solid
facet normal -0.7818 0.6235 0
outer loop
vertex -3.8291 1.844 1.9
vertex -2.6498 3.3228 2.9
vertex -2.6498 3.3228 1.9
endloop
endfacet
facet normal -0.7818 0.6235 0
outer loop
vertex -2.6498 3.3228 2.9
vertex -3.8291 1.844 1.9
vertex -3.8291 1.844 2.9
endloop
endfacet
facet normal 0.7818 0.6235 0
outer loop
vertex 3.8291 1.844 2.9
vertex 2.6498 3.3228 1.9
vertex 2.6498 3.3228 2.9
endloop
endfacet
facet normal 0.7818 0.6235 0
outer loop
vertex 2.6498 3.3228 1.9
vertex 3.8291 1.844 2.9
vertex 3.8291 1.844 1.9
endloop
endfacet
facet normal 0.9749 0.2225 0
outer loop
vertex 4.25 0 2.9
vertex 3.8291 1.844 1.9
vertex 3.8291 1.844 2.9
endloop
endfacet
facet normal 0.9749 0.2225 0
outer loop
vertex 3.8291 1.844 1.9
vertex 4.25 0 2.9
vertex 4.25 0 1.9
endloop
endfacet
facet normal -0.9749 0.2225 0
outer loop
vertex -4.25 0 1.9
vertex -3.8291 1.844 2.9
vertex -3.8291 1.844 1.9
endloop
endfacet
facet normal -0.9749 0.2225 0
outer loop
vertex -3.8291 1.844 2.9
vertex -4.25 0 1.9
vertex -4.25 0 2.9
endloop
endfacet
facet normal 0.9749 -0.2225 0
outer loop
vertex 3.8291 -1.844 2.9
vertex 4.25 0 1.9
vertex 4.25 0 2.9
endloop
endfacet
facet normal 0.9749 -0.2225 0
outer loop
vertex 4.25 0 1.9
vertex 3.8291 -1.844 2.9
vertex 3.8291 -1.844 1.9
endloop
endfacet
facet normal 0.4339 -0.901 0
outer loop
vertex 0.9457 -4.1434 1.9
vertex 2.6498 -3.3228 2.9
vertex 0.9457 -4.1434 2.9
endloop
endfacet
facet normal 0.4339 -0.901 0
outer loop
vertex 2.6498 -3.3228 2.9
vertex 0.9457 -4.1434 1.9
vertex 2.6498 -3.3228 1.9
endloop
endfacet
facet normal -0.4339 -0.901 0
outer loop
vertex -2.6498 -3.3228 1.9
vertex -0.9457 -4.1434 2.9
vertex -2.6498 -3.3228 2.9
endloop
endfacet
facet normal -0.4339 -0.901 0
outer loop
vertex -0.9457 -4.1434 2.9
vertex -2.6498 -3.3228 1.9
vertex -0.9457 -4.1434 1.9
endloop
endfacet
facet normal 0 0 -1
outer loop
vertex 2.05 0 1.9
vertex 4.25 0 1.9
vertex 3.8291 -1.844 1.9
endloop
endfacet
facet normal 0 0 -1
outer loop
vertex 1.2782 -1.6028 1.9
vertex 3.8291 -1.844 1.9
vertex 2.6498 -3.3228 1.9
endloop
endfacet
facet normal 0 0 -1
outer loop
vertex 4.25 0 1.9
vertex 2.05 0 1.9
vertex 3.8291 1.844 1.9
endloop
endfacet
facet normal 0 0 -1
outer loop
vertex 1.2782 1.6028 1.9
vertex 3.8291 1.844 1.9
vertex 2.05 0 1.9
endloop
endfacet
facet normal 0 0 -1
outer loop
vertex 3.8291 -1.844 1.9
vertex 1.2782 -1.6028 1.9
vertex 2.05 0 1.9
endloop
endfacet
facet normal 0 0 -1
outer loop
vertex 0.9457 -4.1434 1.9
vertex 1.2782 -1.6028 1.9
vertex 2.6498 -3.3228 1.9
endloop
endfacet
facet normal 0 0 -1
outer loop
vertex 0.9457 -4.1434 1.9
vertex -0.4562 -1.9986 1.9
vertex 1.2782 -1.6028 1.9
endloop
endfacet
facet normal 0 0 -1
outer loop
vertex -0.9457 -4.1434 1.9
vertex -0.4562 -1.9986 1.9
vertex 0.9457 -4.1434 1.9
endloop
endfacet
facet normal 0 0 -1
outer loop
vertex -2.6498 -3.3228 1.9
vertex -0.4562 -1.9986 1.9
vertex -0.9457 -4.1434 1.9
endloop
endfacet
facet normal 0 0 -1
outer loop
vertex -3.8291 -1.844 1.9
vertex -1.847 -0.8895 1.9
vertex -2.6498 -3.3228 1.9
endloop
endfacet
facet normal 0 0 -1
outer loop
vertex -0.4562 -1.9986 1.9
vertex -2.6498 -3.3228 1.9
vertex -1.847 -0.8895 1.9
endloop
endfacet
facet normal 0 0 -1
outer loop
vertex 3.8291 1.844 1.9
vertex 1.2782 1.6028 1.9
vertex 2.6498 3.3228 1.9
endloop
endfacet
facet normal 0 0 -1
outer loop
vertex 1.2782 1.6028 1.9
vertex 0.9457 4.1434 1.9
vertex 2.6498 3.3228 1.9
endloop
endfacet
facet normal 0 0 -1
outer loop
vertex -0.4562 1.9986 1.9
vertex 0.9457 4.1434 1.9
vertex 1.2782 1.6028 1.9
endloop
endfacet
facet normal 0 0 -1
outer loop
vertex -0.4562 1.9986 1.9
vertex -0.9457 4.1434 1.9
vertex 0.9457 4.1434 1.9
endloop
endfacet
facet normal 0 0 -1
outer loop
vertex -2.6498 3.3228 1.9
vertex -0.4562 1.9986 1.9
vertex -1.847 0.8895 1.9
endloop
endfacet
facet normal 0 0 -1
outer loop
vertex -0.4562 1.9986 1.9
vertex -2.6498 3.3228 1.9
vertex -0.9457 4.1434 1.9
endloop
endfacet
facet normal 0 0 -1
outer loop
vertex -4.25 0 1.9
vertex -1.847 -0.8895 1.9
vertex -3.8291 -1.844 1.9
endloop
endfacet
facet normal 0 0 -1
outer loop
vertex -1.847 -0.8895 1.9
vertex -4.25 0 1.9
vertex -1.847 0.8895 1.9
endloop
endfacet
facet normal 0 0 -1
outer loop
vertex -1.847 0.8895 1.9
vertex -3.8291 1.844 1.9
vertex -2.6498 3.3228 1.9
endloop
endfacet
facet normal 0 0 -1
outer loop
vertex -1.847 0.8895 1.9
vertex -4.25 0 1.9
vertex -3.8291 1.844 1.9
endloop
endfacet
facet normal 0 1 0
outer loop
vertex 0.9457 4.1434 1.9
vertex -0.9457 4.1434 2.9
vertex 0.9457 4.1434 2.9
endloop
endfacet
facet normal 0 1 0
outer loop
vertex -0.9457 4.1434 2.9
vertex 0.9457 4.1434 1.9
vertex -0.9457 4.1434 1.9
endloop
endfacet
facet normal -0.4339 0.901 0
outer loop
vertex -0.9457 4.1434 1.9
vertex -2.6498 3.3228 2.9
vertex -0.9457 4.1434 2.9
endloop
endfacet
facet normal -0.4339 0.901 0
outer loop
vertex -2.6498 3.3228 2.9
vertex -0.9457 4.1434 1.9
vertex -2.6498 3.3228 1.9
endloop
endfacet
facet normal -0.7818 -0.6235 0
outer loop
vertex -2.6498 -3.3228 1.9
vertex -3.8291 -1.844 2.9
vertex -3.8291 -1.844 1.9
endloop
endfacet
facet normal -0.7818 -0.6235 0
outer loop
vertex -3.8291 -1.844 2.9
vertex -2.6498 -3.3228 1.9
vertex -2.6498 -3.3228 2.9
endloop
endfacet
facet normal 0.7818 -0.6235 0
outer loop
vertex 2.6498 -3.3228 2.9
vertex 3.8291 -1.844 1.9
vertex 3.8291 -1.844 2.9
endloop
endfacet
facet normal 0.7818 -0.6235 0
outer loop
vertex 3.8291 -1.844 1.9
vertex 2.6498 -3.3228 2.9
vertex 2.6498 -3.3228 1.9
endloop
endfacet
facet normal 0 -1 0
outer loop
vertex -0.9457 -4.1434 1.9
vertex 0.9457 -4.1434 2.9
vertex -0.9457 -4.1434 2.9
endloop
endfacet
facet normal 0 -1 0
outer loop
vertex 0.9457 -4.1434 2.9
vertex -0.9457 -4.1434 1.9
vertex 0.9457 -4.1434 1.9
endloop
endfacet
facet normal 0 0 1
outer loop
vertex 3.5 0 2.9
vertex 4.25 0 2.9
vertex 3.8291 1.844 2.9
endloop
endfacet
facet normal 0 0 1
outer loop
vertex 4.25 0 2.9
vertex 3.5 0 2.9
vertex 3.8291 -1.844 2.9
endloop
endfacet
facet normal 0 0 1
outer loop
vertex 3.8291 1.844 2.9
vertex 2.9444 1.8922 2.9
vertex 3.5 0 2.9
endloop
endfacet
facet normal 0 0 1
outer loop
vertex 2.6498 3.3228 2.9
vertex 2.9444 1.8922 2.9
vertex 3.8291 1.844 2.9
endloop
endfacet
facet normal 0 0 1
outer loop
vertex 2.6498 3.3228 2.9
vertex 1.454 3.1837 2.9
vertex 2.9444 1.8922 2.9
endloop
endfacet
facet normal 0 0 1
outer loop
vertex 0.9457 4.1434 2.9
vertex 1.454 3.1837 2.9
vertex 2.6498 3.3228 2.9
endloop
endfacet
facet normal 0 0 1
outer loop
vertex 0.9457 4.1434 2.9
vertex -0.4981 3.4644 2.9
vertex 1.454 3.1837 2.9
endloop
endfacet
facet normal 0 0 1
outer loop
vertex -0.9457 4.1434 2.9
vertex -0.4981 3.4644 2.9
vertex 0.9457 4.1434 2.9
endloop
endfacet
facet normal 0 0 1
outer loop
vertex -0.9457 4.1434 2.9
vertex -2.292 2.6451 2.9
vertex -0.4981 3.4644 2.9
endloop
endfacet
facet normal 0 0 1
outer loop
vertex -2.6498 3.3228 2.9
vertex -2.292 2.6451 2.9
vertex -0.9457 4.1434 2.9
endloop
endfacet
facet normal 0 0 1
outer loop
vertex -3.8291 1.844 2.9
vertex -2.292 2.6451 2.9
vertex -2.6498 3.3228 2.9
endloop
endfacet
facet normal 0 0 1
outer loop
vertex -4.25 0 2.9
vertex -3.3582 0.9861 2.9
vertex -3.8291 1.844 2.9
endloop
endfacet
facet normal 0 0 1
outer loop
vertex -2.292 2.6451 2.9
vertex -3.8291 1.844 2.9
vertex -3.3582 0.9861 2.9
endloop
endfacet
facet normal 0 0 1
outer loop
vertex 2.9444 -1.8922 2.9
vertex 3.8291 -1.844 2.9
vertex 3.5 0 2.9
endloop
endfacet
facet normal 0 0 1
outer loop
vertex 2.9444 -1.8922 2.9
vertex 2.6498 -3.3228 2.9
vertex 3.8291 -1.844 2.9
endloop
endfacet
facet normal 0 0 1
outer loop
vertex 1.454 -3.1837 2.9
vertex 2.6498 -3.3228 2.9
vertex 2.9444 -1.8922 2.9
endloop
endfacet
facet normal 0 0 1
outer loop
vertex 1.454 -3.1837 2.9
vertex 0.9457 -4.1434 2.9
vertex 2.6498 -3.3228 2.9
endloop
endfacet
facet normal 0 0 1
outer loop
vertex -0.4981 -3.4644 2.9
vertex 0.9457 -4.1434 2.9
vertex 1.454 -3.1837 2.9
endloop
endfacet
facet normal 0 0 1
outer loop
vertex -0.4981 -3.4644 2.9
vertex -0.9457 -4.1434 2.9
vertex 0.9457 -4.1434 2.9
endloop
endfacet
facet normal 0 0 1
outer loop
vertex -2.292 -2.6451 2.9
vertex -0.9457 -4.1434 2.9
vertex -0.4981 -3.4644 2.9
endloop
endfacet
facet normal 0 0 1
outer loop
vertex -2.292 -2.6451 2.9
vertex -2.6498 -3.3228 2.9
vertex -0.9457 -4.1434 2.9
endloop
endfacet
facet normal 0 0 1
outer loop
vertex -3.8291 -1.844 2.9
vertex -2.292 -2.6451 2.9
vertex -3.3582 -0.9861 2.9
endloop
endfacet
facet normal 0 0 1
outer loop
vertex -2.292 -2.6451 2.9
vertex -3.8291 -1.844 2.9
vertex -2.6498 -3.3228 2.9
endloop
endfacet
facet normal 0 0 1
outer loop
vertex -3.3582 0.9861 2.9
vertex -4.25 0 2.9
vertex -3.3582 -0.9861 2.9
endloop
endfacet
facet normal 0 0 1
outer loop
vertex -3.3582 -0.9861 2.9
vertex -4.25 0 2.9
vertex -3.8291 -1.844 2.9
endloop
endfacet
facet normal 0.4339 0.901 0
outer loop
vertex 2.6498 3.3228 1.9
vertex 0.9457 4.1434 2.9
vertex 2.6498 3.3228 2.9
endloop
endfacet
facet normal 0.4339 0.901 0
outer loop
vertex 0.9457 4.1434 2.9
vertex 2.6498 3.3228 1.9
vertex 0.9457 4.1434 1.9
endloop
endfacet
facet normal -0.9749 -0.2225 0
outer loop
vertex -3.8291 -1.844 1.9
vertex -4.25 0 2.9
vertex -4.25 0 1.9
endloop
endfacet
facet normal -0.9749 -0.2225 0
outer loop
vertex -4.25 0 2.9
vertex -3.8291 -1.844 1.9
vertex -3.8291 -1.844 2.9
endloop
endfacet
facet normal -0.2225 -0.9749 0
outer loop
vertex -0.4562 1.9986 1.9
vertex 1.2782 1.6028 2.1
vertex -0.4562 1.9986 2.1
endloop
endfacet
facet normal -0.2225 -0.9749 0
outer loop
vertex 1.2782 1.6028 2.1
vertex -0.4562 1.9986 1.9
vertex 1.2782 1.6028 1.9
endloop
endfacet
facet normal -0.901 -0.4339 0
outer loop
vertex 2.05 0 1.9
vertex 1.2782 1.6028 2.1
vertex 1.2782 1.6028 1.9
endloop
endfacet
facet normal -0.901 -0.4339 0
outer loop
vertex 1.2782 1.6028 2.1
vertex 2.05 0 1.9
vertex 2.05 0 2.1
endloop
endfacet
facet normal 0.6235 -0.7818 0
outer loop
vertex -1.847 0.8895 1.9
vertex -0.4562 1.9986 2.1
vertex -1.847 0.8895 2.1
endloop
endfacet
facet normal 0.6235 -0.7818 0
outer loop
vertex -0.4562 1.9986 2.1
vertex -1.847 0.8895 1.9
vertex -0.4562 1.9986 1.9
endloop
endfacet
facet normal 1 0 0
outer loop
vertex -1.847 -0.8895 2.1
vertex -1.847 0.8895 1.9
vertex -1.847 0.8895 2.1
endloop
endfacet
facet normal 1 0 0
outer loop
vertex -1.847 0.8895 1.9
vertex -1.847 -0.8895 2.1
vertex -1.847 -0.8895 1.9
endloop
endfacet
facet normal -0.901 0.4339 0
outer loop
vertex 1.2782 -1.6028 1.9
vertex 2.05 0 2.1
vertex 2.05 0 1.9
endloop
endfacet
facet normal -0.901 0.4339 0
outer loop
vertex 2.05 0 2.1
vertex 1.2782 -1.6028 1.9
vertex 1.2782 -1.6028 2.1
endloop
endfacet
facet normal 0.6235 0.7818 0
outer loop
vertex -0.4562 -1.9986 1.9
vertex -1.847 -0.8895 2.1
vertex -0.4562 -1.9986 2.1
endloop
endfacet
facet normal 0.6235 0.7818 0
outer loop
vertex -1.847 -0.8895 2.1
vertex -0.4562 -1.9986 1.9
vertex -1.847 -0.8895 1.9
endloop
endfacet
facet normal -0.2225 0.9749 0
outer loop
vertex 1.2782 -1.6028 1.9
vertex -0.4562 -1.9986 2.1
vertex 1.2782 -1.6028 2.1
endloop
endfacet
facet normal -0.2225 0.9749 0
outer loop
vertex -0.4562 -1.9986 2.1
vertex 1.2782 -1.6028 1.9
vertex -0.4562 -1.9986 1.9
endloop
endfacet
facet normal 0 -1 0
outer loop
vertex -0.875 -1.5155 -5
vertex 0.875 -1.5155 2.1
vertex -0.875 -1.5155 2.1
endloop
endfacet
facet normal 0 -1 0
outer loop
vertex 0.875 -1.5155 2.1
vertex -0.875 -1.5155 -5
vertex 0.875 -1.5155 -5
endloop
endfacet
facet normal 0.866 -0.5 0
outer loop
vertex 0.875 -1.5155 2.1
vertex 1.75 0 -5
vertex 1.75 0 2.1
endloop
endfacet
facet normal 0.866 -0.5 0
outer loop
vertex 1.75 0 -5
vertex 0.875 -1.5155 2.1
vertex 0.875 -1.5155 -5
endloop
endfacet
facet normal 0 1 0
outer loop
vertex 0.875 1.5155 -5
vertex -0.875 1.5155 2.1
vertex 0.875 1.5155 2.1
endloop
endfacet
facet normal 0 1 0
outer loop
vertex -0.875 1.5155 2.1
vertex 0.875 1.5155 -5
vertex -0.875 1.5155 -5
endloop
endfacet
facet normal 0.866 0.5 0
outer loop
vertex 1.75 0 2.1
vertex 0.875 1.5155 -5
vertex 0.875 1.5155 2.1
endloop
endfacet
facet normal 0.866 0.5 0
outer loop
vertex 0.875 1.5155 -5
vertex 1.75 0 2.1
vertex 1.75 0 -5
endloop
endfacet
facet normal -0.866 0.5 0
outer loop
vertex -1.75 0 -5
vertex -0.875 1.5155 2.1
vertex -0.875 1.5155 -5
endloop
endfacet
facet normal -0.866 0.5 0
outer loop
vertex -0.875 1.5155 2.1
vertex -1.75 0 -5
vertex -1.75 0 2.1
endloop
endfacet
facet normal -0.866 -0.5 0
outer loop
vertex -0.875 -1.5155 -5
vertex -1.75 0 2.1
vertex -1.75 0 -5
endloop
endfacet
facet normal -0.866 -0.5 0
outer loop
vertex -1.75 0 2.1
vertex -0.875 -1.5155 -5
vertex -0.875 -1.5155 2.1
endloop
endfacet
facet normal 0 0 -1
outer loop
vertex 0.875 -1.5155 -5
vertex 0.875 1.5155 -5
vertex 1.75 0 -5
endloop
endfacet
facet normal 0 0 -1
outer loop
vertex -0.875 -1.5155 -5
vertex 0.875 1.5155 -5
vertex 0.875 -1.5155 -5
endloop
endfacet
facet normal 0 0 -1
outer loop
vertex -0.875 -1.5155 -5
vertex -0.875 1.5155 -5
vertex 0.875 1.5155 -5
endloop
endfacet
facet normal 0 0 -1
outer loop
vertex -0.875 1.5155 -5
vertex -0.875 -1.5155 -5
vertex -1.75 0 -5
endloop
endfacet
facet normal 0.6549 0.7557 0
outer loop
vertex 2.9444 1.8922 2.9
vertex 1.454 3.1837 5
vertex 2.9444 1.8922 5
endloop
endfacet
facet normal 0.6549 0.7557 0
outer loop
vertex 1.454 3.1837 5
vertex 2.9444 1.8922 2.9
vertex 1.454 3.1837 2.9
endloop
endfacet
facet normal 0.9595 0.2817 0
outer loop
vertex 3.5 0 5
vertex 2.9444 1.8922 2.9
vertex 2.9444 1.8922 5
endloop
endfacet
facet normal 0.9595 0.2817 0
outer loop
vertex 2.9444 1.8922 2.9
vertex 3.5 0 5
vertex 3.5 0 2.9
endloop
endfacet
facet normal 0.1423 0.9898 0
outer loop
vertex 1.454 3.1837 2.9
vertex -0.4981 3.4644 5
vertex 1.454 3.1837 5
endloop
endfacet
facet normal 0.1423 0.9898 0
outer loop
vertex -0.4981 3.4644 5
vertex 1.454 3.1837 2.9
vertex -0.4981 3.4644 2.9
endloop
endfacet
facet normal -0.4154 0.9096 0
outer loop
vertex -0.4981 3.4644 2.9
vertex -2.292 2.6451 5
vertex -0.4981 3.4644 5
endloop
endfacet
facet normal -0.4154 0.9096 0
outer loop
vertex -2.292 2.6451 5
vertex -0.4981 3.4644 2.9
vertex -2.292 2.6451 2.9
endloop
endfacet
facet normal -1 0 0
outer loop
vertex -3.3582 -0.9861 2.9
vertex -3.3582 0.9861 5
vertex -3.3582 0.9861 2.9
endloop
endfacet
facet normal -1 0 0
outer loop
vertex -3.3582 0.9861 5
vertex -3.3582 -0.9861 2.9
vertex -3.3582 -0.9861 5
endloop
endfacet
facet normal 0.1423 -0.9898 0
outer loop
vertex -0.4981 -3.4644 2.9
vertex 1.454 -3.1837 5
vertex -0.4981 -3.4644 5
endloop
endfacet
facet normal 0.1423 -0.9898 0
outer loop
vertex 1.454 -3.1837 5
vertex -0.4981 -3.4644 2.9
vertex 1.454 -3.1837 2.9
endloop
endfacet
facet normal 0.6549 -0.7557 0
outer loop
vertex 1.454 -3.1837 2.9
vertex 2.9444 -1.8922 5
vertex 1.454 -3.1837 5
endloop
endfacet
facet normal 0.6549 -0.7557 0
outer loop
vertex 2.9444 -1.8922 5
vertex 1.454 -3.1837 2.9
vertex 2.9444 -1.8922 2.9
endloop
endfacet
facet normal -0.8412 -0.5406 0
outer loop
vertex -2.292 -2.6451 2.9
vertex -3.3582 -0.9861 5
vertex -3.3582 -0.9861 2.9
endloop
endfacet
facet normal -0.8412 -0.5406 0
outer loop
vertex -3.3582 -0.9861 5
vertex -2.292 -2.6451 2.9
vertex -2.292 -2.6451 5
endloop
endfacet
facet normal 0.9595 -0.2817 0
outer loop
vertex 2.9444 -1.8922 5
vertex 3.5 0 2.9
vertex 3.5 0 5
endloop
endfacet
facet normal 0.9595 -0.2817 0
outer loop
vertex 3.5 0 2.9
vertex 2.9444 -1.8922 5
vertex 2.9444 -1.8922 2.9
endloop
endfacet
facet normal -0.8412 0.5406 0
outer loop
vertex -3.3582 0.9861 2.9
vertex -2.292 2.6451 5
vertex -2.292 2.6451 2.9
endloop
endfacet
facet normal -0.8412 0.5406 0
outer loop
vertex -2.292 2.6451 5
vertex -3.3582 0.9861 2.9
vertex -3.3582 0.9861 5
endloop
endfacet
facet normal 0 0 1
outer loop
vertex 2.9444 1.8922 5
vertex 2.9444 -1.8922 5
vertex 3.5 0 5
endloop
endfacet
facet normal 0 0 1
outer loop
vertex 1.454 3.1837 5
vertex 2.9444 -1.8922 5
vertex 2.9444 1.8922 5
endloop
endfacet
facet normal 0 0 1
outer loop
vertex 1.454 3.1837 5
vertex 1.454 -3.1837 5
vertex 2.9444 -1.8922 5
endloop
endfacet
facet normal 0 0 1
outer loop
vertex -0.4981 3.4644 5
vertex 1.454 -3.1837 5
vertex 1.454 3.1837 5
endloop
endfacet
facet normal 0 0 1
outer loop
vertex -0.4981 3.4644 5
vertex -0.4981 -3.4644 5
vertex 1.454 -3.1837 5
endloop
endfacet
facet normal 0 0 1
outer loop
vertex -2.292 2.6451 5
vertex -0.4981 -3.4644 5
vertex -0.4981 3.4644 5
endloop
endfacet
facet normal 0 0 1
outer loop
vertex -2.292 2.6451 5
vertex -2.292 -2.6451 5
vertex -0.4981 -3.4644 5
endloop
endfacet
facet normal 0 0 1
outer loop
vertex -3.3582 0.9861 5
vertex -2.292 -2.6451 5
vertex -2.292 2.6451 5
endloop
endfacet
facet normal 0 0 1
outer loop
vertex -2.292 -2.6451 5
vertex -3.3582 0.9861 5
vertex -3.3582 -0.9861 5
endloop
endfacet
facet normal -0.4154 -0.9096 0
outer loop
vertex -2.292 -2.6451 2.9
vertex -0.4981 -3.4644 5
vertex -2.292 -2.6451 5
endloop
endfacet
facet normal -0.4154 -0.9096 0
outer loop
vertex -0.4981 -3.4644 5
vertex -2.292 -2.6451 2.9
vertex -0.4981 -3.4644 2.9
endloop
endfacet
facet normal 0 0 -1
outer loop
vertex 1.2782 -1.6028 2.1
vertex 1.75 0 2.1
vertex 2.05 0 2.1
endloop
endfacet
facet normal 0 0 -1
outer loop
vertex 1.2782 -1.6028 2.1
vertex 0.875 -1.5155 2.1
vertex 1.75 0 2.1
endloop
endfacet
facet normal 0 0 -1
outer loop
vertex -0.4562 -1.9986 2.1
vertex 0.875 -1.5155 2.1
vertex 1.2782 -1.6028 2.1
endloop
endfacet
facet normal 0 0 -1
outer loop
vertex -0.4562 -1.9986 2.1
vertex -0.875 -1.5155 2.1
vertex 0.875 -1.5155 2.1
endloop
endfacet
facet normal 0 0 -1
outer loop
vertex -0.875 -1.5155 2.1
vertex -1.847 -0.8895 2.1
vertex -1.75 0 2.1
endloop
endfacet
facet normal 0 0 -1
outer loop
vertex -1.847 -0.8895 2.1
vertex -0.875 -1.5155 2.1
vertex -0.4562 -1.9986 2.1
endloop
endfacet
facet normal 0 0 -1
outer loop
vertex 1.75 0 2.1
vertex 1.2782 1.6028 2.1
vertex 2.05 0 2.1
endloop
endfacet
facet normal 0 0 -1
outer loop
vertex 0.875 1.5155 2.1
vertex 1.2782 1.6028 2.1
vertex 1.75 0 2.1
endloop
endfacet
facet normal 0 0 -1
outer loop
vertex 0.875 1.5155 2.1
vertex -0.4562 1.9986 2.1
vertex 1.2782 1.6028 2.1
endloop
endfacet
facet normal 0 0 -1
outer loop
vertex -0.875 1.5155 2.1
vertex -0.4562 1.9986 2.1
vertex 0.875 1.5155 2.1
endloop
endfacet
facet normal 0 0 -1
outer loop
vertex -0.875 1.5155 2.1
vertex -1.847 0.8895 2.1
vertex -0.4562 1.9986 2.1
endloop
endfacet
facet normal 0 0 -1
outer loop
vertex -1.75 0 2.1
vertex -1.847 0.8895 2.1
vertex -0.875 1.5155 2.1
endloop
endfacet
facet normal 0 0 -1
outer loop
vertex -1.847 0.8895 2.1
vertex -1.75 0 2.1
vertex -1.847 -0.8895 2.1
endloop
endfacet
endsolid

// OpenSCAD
// Parameters
shank_diameter_mm = 3.5; //[1.75:7:0.05]
length_mm = 10; //[5:20:0.5]
head_diameter_mm = 7; //[3.5:14:0.1]
head_height_mm = 2.5; //[1.25:5:0.1]
transition_height_mm = 0.8; //[0.4:1.6:0.05]
transition_radial_mm = 0.6; //[0.3:1.2:0.05]
washer_outer_diameter_mm = 8.5; //[5:17:0.1]
washer_thickness_mm = 1; //[0.5:2:0.05]
washer_clearance_mm = 0.3; //[0.1:0.8:0.05]
overlap_mm = 0.8; //[0.5:2:0.1]

// Screw and Washer - complete geometry
module screw_and_washer() {
  color("DimGray") {
    // Screw Shank
    translate([0, 0, -head_height_mm/2])
      cylinder(r=shank_diameter_mm/2, h=length_mm - head_height_mm, center=true);

    // Screw Head
    translate([0, 0, length_mm/2 - head_height_mm/2])
      cylinder(r=head_diameter_mm/2, h=head_height_mm, center=true);

    // Head to Shank Transition
    translate([0, 0, length_mm/2 - head_height_mm - transition_height_mm/2 + overlap_mm/2])
      cylinder(r=shank_diameter_mm/2 + transition_radial_mm, h=transition_height_mm, center=true);

    // Washer
    difference() {
      translate([0, 0, length_mm/2 - head_height_mm - washer_thickness_mm/2 + overlap_mm/2])
        cylinder(r=washer_outer_diameter_mm/2, h=washer_thickness_mm, center=true);
      translate([0, 0, length_mm/2 - head_height_mm - washer_thickness_mm/2 + overlap_mm/2])
        cylinder(r=shank_diameter_mm/2 + washer_clearance_mm, h=washer_thickness_mm + 2*overlap_mm, center=true);
    }
  }
}

// Assembly
module assembly() {
  screw_and_washer();
}

assembly();
